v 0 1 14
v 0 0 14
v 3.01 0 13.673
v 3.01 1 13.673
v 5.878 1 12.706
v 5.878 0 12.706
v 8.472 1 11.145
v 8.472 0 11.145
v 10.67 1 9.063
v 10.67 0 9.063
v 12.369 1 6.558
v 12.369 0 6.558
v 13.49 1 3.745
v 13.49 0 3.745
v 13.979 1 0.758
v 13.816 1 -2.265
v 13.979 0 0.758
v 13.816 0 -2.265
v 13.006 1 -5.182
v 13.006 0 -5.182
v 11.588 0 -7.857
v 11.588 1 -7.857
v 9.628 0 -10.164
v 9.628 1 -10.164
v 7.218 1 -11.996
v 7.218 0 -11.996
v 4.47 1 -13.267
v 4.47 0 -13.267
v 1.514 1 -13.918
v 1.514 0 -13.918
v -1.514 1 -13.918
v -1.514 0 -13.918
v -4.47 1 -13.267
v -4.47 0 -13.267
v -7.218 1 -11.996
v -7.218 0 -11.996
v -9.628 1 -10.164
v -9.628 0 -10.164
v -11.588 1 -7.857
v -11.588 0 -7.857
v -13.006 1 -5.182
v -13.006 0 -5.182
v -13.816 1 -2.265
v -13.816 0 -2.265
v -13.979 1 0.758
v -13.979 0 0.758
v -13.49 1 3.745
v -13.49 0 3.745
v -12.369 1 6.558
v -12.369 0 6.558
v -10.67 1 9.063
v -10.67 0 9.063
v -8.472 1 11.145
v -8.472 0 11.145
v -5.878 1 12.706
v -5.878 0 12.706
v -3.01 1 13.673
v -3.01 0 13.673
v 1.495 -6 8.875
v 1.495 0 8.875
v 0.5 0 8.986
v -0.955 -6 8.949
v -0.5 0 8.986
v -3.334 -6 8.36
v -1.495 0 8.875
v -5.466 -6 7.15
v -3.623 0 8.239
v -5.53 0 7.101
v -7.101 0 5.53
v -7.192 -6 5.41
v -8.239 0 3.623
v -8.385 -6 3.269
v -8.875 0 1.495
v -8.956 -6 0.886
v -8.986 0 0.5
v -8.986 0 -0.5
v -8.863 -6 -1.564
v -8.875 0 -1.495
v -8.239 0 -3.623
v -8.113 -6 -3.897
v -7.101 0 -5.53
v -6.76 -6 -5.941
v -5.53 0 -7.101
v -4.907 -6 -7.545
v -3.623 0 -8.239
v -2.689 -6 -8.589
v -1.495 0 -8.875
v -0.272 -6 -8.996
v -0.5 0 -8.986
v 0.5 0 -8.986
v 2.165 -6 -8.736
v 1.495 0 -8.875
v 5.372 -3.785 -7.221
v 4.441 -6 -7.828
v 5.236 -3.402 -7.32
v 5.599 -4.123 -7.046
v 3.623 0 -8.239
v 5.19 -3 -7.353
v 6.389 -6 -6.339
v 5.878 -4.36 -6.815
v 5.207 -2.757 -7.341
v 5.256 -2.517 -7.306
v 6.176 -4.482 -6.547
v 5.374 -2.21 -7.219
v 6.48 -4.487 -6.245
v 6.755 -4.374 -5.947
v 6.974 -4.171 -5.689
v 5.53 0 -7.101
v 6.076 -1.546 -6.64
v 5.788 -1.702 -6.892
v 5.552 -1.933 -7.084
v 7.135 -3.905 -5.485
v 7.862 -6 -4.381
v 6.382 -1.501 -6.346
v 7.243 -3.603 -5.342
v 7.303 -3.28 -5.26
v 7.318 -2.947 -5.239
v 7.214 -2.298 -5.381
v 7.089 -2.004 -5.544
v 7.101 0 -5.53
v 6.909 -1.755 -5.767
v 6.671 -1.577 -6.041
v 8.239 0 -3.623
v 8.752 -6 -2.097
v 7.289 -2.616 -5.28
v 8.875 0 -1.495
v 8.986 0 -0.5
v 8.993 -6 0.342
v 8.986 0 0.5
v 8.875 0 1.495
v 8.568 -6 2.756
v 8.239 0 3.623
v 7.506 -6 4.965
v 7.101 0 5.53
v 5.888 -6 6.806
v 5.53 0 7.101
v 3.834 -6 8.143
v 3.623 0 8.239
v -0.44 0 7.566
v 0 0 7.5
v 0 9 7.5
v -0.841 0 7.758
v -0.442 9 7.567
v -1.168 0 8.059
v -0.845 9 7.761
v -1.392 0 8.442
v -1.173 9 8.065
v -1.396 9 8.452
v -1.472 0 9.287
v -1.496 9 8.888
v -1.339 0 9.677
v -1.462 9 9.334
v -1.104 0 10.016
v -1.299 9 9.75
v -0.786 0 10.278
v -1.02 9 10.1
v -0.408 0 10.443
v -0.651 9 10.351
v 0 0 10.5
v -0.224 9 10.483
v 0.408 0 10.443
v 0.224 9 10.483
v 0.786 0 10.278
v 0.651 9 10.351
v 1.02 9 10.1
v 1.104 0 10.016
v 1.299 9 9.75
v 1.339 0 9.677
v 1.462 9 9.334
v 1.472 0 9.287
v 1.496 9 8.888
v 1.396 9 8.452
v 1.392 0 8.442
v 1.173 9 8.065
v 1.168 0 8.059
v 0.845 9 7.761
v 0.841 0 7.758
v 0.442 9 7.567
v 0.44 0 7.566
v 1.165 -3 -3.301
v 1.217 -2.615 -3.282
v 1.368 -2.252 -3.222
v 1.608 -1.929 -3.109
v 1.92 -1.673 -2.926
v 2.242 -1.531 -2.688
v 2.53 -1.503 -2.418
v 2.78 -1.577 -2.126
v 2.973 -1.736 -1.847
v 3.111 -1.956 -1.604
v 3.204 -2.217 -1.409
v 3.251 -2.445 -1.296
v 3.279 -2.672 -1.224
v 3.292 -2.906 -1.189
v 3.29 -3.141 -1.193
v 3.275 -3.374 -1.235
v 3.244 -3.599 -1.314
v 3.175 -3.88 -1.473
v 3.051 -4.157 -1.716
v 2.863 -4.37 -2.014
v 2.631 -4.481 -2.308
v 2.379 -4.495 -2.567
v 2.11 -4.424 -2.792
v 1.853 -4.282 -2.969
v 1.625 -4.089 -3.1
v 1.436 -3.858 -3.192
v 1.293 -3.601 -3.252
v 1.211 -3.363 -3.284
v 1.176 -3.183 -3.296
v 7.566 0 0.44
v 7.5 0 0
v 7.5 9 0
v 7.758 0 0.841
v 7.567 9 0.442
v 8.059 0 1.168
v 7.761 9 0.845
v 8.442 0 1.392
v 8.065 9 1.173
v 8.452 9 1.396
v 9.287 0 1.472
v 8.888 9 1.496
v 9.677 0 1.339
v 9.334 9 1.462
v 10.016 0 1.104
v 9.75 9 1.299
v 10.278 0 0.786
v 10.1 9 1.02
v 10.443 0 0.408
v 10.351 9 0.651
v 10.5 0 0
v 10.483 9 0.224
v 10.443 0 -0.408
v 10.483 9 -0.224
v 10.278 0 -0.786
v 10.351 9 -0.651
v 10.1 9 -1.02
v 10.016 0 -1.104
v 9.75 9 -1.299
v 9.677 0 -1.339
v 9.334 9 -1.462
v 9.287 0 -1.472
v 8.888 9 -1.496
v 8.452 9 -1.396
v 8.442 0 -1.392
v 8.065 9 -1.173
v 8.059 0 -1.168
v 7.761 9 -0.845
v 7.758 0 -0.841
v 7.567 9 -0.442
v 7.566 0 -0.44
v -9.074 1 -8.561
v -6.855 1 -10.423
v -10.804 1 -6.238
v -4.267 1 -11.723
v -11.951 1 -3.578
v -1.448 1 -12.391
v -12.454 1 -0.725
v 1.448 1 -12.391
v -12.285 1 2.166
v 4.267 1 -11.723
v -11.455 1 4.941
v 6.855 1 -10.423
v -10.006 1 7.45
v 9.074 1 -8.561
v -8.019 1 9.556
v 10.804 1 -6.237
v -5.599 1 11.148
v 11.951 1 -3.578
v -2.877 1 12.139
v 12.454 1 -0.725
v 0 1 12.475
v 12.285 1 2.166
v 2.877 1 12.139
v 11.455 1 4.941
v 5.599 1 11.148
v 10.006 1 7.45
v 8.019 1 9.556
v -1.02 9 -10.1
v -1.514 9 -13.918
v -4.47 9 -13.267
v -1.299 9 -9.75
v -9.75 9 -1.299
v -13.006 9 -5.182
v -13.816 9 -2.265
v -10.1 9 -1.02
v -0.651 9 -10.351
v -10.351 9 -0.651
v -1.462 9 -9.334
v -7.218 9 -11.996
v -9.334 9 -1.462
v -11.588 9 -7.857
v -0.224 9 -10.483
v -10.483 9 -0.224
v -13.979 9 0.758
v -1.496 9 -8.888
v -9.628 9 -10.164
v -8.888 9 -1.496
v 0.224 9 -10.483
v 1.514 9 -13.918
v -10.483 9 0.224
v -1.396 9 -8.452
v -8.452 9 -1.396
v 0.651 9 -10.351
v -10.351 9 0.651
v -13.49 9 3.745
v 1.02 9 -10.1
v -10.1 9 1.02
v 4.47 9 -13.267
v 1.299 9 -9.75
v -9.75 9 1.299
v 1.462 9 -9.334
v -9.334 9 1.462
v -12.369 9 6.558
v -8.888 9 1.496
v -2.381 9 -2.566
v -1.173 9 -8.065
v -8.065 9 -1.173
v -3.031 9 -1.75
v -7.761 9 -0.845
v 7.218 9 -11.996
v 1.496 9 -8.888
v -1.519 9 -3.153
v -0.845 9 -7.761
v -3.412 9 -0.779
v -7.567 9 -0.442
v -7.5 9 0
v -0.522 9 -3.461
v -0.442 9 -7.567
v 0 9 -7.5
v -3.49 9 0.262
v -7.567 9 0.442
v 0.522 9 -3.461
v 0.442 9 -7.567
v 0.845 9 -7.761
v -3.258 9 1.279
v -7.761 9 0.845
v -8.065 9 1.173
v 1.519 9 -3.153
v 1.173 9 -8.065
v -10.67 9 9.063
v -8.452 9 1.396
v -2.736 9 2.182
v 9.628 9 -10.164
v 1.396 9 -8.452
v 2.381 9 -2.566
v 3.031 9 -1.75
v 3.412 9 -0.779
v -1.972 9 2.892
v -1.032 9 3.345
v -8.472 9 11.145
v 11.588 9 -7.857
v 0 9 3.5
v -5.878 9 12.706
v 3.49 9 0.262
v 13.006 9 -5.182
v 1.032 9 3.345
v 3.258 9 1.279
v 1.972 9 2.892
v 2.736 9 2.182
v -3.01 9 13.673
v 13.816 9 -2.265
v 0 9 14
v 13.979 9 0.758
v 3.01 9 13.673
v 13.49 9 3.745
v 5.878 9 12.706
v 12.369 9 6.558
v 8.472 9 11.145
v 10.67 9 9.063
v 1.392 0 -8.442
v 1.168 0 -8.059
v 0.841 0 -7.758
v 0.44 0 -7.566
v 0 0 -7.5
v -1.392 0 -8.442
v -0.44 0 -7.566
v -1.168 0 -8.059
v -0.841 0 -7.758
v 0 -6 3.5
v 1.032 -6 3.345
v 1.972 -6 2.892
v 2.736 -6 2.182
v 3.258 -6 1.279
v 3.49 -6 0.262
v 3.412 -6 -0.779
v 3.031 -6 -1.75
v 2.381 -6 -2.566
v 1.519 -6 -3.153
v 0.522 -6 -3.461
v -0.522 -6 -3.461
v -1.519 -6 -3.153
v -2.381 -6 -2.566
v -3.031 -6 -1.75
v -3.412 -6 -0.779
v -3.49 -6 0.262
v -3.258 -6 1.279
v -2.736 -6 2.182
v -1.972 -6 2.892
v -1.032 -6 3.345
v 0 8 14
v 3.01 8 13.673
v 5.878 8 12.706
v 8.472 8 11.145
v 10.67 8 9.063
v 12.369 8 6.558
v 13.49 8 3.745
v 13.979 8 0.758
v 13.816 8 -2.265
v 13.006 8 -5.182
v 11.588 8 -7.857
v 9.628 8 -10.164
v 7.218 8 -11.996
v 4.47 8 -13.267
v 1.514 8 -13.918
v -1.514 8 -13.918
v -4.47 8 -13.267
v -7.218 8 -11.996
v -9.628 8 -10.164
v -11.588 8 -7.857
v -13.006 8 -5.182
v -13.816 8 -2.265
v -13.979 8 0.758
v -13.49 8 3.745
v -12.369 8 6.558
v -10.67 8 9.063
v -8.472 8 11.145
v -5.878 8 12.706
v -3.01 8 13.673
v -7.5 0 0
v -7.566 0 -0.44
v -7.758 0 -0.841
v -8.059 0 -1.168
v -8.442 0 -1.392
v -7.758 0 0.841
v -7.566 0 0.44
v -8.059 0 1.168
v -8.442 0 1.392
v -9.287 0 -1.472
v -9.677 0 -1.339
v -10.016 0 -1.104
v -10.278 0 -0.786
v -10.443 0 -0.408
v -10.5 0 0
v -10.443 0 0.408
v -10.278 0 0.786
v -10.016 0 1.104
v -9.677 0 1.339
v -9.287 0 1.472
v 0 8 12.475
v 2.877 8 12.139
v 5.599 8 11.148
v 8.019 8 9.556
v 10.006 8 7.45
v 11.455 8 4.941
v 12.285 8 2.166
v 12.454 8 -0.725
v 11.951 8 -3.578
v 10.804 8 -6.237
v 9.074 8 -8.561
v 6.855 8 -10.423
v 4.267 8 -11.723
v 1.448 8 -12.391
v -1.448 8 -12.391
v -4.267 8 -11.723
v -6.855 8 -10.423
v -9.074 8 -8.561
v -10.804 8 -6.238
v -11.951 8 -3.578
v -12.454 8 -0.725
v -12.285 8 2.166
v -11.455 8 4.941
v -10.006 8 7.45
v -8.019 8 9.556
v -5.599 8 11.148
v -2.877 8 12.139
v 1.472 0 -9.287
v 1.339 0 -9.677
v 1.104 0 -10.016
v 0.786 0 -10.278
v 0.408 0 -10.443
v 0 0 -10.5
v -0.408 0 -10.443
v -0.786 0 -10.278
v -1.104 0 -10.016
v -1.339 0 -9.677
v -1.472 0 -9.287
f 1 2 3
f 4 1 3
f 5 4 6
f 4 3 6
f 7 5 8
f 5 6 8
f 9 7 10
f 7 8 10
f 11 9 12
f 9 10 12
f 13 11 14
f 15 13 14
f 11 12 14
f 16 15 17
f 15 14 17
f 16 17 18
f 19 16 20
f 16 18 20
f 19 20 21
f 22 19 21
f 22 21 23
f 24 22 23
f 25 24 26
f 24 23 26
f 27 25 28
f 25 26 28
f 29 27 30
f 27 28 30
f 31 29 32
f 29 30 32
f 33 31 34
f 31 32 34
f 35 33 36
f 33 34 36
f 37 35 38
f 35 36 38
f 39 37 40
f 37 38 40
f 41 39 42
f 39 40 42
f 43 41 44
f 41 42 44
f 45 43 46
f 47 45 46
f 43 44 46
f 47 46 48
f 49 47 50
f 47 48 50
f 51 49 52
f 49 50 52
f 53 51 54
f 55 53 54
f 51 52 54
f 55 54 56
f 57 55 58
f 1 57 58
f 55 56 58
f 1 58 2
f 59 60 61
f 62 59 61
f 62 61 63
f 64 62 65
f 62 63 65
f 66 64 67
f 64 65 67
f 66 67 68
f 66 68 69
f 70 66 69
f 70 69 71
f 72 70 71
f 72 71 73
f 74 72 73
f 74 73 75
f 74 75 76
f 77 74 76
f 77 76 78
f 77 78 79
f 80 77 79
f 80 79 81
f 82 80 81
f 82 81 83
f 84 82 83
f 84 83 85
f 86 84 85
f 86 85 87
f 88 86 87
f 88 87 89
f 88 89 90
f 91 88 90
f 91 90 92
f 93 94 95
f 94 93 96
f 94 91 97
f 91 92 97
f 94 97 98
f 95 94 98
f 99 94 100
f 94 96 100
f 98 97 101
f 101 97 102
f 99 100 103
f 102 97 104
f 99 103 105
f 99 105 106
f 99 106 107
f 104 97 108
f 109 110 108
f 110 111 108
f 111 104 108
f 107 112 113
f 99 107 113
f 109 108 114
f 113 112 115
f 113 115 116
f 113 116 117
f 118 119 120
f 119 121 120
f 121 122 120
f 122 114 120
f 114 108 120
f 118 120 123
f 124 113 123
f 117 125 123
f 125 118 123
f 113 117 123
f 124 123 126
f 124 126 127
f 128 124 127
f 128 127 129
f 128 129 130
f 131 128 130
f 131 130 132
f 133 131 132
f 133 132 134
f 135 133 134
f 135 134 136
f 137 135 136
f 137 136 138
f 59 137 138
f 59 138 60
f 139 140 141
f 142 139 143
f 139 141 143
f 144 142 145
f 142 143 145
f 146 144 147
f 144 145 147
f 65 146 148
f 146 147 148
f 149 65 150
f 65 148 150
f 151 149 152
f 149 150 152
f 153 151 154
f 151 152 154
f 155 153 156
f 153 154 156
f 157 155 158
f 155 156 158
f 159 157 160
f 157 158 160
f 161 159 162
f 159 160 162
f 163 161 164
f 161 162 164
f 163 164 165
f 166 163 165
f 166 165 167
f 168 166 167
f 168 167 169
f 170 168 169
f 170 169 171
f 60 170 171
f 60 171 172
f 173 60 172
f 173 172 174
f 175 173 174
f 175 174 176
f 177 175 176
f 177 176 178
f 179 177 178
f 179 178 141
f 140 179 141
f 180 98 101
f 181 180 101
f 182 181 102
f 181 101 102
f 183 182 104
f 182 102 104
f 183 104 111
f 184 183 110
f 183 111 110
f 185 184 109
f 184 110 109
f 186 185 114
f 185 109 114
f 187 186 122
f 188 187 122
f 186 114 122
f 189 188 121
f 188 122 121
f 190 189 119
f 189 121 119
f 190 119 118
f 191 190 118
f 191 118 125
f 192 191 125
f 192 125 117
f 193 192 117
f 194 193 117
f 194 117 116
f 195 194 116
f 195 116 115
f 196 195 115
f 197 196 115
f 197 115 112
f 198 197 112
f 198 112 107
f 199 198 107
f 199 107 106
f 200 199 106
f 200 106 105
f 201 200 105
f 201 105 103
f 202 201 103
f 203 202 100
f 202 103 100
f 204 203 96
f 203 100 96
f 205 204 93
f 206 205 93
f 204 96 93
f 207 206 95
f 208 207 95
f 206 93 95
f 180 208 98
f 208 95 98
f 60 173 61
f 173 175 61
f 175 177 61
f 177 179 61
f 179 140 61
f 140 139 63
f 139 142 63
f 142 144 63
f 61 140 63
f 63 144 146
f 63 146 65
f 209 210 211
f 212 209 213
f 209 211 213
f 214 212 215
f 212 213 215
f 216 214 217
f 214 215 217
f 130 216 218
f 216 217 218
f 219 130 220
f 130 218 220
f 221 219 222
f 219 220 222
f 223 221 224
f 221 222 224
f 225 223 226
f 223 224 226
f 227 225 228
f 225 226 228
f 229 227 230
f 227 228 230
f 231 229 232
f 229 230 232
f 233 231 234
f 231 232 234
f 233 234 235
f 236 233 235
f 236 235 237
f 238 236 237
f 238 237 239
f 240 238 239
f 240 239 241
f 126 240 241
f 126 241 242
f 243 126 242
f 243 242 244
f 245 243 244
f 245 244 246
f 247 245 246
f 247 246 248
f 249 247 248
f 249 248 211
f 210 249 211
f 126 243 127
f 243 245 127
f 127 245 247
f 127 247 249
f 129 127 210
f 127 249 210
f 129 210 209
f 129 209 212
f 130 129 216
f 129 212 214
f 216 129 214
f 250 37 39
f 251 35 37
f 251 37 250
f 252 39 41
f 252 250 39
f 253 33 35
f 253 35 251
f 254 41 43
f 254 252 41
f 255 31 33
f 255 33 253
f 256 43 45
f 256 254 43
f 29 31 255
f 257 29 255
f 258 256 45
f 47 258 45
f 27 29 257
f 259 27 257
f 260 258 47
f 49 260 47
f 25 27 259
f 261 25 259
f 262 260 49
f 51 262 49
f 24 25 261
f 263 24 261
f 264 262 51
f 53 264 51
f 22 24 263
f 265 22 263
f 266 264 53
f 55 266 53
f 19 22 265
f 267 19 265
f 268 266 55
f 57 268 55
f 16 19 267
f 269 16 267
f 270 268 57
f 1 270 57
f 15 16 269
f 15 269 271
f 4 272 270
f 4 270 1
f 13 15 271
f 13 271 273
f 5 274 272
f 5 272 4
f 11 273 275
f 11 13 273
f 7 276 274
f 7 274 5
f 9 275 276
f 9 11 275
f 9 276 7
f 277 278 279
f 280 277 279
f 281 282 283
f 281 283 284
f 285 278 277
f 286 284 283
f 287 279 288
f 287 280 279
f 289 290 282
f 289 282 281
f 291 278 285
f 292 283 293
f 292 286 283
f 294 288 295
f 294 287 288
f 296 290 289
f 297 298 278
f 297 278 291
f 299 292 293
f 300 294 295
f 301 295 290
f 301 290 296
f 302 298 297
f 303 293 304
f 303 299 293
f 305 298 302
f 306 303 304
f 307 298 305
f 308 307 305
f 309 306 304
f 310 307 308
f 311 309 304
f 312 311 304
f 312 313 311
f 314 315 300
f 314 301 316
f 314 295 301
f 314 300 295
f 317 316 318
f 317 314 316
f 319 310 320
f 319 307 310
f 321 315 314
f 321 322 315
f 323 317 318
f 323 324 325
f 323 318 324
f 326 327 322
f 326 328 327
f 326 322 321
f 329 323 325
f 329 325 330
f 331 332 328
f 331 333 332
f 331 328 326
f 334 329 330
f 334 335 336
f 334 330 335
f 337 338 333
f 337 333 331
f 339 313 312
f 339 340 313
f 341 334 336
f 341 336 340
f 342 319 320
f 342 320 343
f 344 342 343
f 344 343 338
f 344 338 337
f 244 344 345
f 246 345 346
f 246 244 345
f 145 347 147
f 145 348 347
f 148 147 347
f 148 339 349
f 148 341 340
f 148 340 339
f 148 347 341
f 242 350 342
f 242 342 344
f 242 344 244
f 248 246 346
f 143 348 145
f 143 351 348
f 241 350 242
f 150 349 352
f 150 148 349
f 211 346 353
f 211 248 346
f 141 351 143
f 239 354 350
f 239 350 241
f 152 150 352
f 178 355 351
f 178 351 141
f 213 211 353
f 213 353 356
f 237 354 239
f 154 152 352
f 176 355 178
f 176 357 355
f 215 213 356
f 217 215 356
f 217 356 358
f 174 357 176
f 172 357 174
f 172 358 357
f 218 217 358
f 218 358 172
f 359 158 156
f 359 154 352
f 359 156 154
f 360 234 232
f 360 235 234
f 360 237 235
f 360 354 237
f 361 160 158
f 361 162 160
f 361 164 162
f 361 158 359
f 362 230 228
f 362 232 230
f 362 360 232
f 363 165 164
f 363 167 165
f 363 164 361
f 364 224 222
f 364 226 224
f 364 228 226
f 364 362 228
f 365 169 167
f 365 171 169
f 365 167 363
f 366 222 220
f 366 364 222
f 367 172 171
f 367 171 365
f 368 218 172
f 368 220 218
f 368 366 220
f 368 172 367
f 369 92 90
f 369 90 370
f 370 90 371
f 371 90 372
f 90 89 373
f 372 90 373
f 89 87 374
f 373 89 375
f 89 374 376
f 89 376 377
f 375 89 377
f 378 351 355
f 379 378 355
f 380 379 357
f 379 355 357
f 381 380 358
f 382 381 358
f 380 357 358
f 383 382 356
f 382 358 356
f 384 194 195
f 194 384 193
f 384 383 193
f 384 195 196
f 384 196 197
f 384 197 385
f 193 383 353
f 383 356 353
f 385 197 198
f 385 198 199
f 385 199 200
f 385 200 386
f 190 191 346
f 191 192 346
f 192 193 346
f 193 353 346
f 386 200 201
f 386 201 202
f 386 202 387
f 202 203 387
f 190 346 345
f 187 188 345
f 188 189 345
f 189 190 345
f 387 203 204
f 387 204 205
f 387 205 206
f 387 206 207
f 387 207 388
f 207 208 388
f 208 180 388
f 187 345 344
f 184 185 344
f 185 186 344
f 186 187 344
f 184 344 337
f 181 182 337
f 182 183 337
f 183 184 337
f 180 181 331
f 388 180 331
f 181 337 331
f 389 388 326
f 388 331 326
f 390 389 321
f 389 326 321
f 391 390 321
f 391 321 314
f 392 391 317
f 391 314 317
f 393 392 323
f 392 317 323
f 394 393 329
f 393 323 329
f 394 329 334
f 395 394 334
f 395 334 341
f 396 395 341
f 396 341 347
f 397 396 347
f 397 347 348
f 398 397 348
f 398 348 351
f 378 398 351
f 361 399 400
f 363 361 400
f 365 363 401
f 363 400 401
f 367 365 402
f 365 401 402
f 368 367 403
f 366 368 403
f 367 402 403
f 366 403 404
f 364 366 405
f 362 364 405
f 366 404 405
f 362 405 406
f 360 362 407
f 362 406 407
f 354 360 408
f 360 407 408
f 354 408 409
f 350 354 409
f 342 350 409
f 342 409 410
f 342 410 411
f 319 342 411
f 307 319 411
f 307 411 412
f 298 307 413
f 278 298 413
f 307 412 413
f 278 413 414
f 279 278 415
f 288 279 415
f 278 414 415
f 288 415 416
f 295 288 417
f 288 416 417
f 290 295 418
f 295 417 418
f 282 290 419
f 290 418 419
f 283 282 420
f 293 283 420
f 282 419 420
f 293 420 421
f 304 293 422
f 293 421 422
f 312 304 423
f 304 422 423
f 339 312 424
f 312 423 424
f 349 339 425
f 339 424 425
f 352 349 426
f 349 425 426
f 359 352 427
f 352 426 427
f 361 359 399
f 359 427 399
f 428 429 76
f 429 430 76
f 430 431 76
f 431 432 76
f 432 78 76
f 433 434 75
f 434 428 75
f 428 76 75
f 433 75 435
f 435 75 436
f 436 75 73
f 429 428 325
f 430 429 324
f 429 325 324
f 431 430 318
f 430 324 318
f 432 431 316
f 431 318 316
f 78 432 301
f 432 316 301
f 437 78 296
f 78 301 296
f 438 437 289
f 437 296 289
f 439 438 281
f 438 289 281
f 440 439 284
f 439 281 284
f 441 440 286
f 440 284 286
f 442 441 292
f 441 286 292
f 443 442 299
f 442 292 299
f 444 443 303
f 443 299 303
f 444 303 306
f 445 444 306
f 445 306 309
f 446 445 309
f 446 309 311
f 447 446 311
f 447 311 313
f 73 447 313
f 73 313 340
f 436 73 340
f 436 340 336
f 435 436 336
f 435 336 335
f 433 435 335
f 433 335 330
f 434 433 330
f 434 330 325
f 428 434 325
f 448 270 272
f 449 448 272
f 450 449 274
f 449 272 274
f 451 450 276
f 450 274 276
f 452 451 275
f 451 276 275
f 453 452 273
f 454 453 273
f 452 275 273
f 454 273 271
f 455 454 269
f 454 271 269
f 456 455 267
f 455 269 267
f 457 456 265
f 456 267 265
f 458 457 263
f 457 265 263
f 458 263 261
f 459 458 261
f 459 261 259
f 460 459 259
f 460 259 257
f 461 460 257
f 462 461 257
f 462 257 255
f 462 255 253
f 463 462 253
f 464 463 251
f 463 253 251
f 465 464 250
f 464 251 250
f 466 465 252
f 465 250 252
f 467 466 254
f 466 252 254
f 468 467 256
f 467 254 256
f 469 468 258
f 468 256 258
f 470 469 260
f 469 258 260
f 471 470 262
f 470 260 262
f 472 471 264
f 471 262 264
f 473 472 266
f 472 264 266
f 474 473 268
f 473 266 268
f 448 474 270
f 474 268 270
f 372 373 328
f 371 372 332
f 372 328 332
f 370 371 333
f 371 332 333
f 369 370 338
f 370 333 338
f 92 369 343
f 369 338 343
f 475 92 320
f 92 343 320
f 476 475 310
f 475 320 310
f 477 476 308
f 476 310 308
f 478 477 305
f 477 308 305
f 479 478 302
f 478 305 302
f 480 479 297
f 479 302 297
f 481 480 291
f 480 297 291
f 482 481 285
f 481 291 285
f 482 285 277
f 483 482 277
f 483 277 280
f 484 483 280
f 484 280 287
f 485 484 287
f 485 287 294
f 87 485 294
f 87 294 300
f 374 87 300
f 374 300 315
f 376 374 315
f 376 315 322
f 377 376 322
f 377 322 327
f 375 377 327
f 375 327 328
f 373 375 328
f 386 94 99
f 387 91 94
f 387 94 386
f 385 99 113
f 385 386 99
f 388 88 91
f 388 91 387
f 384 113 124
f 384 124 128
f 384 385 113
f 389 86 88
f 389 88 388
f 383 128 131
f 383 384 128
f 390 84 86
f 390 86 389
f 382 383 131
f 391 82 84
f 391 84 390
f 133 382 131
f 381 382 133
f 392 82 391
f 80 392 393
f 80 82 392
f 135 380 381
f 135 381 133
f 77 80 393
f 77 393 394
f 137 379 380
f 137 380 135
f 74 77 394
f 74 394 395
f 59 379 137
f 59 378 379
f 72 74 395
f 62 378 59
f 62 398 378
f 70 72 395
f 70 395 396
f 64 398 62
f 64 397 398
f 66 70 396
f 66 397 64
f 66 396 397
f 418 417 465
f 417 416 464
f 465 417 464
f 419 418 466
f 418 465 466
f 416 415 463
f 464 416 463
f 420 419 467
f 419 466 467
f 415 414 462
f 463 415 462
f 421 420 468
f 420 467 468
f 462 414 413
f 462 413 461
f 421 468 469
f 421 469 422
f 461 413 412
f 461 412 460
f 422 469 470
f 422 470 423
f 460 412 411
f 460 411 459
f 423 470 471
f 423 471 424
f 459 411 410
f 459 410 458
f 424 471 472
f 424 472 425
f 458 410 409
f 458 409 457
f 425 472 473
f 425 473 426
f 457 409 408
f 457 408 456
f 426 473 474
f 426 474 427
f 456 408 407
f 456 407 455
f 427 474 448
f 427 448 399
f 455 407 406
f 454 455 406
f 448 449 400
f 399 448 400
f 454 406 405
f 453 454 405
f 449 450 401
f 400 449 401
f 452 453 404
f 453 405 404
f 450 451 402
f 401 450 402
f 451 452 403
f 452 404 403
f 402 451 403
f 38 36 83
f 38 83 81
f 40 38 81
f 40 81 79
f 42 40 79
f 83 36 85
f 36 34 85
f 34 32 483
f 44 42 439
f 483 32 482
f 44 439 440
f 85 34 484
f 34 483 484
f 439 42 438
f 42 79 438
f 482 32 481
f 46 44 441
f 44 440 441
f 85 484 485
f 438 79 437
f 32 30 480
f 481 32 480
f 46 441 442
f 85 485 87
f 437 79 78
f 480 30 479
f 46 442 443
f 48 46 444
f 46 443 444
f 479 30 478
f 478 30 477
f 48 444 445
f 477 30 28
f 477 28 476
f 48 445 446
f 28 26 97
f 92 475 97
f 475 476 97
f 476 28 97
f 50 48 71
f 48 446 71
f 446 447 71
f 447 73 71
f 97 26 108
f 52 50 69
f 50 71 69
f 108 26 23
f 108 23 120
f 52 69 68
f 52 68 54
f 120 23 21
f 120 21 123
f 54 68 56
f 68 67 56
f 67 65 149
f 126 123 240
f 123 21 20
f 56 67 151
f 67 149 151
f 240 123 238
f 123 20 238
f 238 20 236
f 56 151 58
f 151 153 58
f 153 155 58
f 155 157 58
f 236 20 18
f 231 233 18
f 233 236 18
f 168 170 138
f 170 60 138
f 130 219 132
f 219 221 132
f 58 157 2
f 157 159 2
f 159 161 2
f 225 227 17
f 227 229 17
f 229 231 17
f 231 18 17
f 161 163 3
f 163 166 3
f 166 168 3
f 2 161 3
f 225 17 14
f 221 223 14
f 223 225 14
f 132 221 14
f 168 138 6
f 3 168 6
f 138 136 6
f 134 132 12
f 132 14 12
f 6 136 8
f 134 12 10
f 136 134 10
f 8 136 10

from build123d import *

# Parameters (mm, degrees)
SKETCH1_R                     = 14
BOSS_EXTRUDE1_DEPTH           = 1
SKETCH2_R                     = 12.475
BOSS_EXTRUDE2_DEPTH           = 7
SKETCH3_R                     = 14
BOSS_EXTRUDE3_DEPTH           = 1
SKETCH5_R                     = 1.5
CUT_EXTRUDE2_DEPTH            = 22.748563171
CIRPATTERN1_COUNT             = 4
SKETCH6_R                     = 9
BOSS_EXTRUDE4_DEPTH           = 6
SKETCH4_R                     = 3.5
CUT_EXTRUDE1_DEPTH            = 25.839484697
F_3_0_3_DIAMETER_HOLE1_REACH  = 33.199
F_3_0_3_DIAMETER_HOLE1_BORE_R = 1.5


with BuildPart() as part:
    # Sketch1 → Boss-Extrude1 (new body)
    with BuildSketch(Plane(origin=(0, 0, 0), x_dir=(1, 0, 0), z_dir=(0, 1, 0))):
        with Locations(Location((0, 0, 0), (0, 0, 270))):
            Circle(SKETCH1_R)
    extrude(amount=BOSS_EXTRUDE1_DEPTH)

    # Sketch2 → Boss-Extrude2 (add)
    with BuildSketch(Plane(origin=(0, 1, 0), x_dir=(1, 0, 0), z_dir=(0, 1, 0))):
        with Locations(Location((0, 0, 0), (0, 0, 270))):
            Circle(SKETCH2_R)
    extrude(amount=BOSS_EXTRUDE2_DEPTH)

    # Sketch3 → Boss-Extrude3 (add)
    with BuildSketch(Plane(origin=(0, 8, 0), x_dir=(1, 0, 0), z_dir=(0, 1, 0))):
        with Locations(Location((0, 0, 0), (0, 0, 270))):
            Circle(SKETCH3_R)
    extrude(amount=BOSS_EXTRUDE3_DEPTH)

    # Sketch5 → Cut-Extrude2 (cut, through all)
    with BuildSketch(Plane(origin=(0, 9, 0), x_dir=(1, 0, 0), z_dir=(0, 1, 0))):
        with Locations(Location((0, 9, 0), (0, 0, 270))):
            Circle(SKETCH5_R)
    cut_extrude2 = extrude(amount=-CUT_EXTRUDE2_DEPTH, mode=Mode.SUBTRACT)

    # CirPattern1: Cut-Extrude2 ×4 about axis
    cirpattern1_axis = Axis((0, 0, 0), (0, 1, 0))
    for i in range(1, CIRPATTERN1_COUNT):
        add(cut_extrude2.rotate(cirpattern1_axis, i * 360 / CIRPATTERN1_COUNT), mode=Mode.SUBTRACT)

    # Sketch6 → Boss-Extrude4 (add)
    with BuildSketch(Plane.XZ):
        with Locations(Location((0, 0, 0), (0, 0, 80.439616306))):
            Circle(SKETCH6_R)
    extrude(amount=BOSS_EXTRUDE4_DEPTH)

    # Sketch4 → Cut-Extrude1 (cut, through all)
    with BuildSketch(Plane(origin=(0, 9, 0), x_dir=(1, 0, 0), z_dir=(0, 1, 0))):
        with Locations(Location((0, 0, 0), (0, 0, 270))):
            Circle(SKETCH4_R)
    extrude(amount=-CUT_EXTRUDE1_DEPTH, mode=Mode.SUBTRACT)

    # Ø3.0 (3) Diameter Hole1 bore (on position points) → Ø3.0 (3) Diameter Hole1 (cut, up to next)
    with BuildSketch(Plane(origin=(6.342952696, -3, -6.384900242), x_dir=(-0.709433360177, 0, -0.704772521789), z_dir=(0.704772521789, 0, -0.709433360177)), mode=Mode.PRIVATE) as f_3_0_3_diameter_hole1_sk1:
        Circle(F_3_0_3_DIAMETER_HOLE1_BORE_R)
    f_3_0_3_diameter_hole1_tool1 = extrude(f_3_0_3_diameter_hole1_sk1.sketch, amount=-F_3_0_3_DIAMETER_HOLE1_REACH, mode=Mode.PRIVATE) & part.part
    add(f_3_0_3_diameter_hole1_tool1.solids().sort_by_distance((6.342953, -3, -6.3849))[0], mode=Mode.SUBTRACT)


solid = part.part
